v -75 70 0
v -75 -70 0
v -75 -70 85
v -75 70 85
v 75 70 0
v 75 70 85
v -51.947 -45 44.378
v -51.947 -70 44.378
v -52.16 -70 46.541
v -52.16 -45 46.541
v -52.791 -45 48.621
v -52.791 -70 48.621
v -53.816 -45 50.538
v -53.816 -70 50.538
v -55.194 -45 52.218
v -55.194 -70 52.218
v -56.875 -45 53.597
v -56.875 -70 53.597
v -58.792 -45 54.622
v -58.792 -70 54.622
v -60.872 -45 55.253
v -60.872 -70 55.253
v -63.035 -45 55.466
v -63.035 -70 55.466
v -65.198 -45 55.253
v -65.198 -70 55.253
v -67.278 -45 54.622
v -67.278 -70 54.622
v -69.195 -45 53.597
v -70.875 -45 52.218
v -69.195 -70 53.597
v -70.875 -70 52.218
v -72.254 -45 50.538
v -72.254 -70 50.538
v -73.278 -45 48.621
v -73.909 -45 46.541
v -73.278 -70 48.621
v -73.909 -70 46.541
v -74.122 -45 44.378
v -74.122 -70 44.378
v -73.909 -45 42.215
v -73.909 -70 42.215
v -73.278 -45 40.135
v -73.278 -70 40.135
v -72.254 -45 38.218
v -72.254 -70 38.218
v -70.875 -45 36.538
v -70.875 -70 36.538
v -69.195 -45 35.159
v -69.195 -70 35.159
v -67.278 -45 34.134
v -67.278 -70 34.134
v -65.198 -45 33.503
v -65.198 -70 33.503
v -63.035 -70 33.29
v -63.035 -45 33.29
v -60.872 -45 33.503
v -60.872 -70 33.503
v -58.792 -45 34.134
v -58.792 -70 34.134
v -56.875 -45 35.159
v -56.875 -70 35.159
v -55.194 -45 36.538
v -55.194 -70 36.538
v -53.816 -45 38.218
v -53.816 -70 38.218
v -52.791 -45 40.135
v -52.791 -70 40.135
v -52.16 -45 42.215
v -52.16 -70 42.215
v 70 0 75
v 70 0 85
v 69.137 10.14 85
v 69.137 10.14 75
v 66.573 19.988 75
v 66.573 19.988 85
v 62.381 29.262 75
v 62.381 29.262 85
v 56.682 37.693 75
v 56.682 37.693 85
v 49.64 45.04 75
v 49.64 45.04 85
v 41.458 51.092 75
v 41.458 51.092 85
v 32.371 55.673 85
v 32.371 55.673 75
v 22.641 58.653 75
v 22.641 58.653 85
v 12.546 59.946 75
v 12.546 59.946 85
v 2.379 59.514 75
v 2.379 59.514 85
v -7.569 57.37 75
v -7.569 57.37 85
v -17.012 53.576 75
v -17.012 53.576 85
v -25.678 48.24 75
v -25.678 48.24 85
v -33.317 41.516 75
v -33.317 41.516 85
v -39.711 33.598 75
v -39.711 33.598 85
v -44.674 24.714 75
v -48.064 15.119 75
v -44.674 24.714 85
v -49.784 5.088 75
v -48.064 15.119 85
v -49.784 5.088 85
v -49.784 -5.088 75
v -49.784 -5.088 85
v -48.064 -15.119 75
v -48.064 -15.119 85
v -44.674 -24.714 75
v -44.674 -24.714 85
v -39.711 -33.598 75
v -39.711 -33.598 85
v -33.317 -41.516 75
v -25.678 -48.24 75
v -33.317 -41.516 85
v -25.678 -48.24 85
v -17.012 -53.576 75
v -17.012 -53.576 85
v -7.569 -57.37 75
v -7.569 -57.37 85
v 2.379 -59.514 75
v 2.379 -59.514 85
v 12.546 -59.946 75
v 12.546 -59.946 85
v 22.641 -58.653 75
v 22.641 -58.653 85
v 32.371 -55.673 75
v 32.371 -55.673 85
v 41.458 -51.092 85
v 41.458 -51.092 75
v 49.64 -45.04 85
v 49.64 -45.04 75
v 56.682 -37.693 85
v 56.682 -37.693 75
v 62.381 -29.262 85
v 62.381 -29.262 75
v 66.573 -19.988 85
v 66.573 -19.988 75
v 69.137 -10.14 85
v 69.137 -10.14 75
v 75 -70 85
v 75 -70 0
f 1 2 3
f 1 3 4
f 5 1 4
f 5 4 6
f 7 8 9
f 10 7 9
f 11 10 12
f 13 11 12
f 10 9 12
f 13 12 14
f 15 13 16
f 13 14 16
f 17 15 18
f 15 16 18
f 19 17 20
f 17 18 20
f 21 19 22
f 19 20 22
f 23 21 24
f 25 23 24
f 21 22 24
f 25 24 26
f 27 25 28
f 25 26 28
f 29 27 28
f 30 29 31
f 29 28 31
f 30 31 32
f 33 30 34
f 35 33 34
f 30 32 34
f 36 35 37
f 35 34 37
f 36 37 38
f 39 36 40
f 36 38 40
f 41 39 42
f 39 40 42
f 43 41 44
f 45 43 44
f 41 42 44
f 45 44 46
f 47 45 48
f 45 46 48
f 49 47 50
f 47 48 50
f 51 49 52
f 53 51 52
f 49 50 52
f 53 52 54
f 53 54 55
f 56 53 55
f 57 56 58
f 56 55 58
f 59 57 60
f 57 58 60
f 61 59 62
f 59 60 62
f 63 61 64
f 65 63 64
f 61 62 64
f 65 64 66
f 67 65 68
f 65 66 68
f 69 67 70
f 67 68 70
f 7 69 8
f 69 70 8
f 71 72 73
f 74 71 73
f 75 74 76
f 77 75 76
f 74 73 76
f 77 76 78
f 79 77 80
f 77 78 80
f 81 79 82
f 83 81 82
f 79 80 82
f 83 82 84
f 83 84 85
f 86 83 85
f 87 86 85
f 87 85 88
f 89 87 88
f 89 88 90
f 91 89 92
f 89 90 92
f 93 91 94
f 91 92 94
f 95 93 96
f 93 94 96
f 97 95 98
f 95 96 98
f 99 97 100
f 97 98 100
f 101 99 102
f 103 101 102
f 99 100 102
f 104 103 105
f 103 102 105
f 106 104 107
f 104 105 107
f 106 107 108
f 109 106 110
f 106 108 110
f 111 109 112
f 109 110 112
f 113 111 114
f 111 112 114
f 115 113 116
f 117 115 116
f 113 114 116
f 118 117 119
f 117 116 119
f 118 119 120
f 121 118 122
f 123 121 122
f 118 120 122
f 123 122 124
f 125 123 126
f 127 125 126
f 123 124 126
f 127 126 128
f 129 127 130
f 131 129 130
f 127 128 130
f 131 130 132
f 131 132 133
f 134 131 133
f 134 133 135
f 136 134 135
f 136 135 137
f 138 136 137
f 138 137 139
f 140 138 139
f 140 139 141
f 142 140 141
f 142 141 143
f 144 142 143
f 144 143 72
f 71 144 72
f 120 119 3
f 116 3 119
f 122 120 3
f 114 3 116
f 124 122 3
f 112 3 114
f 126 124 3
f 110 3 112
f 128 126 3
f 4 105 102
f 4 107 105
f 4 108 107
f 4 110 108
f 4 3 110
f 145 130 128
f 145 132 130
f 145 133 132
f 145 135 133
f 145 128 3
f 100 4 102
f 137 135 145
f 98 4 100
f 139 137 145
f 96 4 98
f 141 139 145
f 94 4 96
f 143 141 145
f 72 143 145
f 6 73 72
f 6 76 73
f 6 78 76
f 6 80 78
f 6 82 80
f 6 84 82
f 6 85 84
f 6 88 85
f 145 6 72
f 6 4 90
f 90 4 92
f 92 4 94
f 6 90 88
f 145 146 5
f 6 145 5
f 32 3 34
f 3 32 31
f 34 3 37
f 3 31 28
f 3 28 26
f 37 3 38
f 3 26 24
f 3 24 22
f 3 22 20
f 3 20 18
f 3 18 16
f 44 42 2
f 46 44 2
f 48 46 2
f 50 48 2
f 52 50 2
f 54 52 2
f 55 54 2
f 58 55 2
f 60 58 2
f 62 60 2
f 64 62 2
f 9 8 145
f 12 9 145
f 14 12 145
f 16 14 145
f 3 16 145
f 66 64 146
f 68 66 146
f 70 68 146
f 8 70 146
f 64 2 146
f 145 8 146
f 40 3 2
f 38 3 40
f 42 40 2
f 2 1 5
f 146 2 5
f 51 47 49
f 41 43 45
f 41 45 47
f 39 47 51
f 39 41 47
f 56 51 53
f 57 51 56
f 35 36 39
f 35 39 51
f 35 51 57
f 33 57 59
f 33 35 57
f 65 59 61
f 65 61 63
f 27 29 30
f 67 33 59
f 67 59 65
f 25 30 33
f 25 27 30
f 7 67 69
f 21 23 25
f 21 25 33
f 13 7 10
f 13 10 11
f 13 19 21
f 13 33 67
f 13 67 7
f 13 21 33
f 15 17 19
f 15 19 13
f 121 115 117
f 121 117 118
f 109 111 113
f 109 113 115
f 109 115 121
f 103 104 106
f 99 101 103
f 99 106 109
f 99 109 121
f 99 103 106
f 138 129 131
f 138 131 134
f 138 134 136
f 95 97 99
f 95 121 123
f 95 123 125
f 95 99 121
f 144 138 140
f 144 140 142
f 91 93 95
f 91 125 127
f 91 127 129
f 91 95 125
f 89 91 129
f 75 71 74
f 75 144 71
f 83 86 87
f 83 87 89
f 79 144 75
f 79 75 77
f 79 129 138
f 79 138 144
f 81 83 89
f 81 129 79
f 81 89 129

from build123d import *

# Parameters (mm, degrees)
F0_W     = 150
F0_H     = 140
F1_DEPTH = 85
F2_R     = 11.08773
F3_DEPTH = 25
F4_R     = 60
F5_DEPTH = 10


with BuildPart() as f1:
    # F0 (on Top) → F1 (new body)
    with BuildSketch(Plane.XY):
        Rectangle(F0_W, F0_H)
    extrude(amount=F1_DEPTH)

    # F2 (on face) → F3 (cut)
    with BuildSketch(Plane.XZ.offset(70)):
        with Locations((-63.034661, 44.377975)):
            Circle(F2_R)
    extrude(amount=-F3_DEPTH, mode=Mode.SUBTRACT)

    # F4 (on face) → F5 (cut)
    with BuildSketch(Plane.XY.offset(85)):
        with Locations((10, 0)):
            Circle(F4_R)
    extrude(amount=-F5_DEPTH, mode=Mode.SUBTRACT)


solid = f1.part
